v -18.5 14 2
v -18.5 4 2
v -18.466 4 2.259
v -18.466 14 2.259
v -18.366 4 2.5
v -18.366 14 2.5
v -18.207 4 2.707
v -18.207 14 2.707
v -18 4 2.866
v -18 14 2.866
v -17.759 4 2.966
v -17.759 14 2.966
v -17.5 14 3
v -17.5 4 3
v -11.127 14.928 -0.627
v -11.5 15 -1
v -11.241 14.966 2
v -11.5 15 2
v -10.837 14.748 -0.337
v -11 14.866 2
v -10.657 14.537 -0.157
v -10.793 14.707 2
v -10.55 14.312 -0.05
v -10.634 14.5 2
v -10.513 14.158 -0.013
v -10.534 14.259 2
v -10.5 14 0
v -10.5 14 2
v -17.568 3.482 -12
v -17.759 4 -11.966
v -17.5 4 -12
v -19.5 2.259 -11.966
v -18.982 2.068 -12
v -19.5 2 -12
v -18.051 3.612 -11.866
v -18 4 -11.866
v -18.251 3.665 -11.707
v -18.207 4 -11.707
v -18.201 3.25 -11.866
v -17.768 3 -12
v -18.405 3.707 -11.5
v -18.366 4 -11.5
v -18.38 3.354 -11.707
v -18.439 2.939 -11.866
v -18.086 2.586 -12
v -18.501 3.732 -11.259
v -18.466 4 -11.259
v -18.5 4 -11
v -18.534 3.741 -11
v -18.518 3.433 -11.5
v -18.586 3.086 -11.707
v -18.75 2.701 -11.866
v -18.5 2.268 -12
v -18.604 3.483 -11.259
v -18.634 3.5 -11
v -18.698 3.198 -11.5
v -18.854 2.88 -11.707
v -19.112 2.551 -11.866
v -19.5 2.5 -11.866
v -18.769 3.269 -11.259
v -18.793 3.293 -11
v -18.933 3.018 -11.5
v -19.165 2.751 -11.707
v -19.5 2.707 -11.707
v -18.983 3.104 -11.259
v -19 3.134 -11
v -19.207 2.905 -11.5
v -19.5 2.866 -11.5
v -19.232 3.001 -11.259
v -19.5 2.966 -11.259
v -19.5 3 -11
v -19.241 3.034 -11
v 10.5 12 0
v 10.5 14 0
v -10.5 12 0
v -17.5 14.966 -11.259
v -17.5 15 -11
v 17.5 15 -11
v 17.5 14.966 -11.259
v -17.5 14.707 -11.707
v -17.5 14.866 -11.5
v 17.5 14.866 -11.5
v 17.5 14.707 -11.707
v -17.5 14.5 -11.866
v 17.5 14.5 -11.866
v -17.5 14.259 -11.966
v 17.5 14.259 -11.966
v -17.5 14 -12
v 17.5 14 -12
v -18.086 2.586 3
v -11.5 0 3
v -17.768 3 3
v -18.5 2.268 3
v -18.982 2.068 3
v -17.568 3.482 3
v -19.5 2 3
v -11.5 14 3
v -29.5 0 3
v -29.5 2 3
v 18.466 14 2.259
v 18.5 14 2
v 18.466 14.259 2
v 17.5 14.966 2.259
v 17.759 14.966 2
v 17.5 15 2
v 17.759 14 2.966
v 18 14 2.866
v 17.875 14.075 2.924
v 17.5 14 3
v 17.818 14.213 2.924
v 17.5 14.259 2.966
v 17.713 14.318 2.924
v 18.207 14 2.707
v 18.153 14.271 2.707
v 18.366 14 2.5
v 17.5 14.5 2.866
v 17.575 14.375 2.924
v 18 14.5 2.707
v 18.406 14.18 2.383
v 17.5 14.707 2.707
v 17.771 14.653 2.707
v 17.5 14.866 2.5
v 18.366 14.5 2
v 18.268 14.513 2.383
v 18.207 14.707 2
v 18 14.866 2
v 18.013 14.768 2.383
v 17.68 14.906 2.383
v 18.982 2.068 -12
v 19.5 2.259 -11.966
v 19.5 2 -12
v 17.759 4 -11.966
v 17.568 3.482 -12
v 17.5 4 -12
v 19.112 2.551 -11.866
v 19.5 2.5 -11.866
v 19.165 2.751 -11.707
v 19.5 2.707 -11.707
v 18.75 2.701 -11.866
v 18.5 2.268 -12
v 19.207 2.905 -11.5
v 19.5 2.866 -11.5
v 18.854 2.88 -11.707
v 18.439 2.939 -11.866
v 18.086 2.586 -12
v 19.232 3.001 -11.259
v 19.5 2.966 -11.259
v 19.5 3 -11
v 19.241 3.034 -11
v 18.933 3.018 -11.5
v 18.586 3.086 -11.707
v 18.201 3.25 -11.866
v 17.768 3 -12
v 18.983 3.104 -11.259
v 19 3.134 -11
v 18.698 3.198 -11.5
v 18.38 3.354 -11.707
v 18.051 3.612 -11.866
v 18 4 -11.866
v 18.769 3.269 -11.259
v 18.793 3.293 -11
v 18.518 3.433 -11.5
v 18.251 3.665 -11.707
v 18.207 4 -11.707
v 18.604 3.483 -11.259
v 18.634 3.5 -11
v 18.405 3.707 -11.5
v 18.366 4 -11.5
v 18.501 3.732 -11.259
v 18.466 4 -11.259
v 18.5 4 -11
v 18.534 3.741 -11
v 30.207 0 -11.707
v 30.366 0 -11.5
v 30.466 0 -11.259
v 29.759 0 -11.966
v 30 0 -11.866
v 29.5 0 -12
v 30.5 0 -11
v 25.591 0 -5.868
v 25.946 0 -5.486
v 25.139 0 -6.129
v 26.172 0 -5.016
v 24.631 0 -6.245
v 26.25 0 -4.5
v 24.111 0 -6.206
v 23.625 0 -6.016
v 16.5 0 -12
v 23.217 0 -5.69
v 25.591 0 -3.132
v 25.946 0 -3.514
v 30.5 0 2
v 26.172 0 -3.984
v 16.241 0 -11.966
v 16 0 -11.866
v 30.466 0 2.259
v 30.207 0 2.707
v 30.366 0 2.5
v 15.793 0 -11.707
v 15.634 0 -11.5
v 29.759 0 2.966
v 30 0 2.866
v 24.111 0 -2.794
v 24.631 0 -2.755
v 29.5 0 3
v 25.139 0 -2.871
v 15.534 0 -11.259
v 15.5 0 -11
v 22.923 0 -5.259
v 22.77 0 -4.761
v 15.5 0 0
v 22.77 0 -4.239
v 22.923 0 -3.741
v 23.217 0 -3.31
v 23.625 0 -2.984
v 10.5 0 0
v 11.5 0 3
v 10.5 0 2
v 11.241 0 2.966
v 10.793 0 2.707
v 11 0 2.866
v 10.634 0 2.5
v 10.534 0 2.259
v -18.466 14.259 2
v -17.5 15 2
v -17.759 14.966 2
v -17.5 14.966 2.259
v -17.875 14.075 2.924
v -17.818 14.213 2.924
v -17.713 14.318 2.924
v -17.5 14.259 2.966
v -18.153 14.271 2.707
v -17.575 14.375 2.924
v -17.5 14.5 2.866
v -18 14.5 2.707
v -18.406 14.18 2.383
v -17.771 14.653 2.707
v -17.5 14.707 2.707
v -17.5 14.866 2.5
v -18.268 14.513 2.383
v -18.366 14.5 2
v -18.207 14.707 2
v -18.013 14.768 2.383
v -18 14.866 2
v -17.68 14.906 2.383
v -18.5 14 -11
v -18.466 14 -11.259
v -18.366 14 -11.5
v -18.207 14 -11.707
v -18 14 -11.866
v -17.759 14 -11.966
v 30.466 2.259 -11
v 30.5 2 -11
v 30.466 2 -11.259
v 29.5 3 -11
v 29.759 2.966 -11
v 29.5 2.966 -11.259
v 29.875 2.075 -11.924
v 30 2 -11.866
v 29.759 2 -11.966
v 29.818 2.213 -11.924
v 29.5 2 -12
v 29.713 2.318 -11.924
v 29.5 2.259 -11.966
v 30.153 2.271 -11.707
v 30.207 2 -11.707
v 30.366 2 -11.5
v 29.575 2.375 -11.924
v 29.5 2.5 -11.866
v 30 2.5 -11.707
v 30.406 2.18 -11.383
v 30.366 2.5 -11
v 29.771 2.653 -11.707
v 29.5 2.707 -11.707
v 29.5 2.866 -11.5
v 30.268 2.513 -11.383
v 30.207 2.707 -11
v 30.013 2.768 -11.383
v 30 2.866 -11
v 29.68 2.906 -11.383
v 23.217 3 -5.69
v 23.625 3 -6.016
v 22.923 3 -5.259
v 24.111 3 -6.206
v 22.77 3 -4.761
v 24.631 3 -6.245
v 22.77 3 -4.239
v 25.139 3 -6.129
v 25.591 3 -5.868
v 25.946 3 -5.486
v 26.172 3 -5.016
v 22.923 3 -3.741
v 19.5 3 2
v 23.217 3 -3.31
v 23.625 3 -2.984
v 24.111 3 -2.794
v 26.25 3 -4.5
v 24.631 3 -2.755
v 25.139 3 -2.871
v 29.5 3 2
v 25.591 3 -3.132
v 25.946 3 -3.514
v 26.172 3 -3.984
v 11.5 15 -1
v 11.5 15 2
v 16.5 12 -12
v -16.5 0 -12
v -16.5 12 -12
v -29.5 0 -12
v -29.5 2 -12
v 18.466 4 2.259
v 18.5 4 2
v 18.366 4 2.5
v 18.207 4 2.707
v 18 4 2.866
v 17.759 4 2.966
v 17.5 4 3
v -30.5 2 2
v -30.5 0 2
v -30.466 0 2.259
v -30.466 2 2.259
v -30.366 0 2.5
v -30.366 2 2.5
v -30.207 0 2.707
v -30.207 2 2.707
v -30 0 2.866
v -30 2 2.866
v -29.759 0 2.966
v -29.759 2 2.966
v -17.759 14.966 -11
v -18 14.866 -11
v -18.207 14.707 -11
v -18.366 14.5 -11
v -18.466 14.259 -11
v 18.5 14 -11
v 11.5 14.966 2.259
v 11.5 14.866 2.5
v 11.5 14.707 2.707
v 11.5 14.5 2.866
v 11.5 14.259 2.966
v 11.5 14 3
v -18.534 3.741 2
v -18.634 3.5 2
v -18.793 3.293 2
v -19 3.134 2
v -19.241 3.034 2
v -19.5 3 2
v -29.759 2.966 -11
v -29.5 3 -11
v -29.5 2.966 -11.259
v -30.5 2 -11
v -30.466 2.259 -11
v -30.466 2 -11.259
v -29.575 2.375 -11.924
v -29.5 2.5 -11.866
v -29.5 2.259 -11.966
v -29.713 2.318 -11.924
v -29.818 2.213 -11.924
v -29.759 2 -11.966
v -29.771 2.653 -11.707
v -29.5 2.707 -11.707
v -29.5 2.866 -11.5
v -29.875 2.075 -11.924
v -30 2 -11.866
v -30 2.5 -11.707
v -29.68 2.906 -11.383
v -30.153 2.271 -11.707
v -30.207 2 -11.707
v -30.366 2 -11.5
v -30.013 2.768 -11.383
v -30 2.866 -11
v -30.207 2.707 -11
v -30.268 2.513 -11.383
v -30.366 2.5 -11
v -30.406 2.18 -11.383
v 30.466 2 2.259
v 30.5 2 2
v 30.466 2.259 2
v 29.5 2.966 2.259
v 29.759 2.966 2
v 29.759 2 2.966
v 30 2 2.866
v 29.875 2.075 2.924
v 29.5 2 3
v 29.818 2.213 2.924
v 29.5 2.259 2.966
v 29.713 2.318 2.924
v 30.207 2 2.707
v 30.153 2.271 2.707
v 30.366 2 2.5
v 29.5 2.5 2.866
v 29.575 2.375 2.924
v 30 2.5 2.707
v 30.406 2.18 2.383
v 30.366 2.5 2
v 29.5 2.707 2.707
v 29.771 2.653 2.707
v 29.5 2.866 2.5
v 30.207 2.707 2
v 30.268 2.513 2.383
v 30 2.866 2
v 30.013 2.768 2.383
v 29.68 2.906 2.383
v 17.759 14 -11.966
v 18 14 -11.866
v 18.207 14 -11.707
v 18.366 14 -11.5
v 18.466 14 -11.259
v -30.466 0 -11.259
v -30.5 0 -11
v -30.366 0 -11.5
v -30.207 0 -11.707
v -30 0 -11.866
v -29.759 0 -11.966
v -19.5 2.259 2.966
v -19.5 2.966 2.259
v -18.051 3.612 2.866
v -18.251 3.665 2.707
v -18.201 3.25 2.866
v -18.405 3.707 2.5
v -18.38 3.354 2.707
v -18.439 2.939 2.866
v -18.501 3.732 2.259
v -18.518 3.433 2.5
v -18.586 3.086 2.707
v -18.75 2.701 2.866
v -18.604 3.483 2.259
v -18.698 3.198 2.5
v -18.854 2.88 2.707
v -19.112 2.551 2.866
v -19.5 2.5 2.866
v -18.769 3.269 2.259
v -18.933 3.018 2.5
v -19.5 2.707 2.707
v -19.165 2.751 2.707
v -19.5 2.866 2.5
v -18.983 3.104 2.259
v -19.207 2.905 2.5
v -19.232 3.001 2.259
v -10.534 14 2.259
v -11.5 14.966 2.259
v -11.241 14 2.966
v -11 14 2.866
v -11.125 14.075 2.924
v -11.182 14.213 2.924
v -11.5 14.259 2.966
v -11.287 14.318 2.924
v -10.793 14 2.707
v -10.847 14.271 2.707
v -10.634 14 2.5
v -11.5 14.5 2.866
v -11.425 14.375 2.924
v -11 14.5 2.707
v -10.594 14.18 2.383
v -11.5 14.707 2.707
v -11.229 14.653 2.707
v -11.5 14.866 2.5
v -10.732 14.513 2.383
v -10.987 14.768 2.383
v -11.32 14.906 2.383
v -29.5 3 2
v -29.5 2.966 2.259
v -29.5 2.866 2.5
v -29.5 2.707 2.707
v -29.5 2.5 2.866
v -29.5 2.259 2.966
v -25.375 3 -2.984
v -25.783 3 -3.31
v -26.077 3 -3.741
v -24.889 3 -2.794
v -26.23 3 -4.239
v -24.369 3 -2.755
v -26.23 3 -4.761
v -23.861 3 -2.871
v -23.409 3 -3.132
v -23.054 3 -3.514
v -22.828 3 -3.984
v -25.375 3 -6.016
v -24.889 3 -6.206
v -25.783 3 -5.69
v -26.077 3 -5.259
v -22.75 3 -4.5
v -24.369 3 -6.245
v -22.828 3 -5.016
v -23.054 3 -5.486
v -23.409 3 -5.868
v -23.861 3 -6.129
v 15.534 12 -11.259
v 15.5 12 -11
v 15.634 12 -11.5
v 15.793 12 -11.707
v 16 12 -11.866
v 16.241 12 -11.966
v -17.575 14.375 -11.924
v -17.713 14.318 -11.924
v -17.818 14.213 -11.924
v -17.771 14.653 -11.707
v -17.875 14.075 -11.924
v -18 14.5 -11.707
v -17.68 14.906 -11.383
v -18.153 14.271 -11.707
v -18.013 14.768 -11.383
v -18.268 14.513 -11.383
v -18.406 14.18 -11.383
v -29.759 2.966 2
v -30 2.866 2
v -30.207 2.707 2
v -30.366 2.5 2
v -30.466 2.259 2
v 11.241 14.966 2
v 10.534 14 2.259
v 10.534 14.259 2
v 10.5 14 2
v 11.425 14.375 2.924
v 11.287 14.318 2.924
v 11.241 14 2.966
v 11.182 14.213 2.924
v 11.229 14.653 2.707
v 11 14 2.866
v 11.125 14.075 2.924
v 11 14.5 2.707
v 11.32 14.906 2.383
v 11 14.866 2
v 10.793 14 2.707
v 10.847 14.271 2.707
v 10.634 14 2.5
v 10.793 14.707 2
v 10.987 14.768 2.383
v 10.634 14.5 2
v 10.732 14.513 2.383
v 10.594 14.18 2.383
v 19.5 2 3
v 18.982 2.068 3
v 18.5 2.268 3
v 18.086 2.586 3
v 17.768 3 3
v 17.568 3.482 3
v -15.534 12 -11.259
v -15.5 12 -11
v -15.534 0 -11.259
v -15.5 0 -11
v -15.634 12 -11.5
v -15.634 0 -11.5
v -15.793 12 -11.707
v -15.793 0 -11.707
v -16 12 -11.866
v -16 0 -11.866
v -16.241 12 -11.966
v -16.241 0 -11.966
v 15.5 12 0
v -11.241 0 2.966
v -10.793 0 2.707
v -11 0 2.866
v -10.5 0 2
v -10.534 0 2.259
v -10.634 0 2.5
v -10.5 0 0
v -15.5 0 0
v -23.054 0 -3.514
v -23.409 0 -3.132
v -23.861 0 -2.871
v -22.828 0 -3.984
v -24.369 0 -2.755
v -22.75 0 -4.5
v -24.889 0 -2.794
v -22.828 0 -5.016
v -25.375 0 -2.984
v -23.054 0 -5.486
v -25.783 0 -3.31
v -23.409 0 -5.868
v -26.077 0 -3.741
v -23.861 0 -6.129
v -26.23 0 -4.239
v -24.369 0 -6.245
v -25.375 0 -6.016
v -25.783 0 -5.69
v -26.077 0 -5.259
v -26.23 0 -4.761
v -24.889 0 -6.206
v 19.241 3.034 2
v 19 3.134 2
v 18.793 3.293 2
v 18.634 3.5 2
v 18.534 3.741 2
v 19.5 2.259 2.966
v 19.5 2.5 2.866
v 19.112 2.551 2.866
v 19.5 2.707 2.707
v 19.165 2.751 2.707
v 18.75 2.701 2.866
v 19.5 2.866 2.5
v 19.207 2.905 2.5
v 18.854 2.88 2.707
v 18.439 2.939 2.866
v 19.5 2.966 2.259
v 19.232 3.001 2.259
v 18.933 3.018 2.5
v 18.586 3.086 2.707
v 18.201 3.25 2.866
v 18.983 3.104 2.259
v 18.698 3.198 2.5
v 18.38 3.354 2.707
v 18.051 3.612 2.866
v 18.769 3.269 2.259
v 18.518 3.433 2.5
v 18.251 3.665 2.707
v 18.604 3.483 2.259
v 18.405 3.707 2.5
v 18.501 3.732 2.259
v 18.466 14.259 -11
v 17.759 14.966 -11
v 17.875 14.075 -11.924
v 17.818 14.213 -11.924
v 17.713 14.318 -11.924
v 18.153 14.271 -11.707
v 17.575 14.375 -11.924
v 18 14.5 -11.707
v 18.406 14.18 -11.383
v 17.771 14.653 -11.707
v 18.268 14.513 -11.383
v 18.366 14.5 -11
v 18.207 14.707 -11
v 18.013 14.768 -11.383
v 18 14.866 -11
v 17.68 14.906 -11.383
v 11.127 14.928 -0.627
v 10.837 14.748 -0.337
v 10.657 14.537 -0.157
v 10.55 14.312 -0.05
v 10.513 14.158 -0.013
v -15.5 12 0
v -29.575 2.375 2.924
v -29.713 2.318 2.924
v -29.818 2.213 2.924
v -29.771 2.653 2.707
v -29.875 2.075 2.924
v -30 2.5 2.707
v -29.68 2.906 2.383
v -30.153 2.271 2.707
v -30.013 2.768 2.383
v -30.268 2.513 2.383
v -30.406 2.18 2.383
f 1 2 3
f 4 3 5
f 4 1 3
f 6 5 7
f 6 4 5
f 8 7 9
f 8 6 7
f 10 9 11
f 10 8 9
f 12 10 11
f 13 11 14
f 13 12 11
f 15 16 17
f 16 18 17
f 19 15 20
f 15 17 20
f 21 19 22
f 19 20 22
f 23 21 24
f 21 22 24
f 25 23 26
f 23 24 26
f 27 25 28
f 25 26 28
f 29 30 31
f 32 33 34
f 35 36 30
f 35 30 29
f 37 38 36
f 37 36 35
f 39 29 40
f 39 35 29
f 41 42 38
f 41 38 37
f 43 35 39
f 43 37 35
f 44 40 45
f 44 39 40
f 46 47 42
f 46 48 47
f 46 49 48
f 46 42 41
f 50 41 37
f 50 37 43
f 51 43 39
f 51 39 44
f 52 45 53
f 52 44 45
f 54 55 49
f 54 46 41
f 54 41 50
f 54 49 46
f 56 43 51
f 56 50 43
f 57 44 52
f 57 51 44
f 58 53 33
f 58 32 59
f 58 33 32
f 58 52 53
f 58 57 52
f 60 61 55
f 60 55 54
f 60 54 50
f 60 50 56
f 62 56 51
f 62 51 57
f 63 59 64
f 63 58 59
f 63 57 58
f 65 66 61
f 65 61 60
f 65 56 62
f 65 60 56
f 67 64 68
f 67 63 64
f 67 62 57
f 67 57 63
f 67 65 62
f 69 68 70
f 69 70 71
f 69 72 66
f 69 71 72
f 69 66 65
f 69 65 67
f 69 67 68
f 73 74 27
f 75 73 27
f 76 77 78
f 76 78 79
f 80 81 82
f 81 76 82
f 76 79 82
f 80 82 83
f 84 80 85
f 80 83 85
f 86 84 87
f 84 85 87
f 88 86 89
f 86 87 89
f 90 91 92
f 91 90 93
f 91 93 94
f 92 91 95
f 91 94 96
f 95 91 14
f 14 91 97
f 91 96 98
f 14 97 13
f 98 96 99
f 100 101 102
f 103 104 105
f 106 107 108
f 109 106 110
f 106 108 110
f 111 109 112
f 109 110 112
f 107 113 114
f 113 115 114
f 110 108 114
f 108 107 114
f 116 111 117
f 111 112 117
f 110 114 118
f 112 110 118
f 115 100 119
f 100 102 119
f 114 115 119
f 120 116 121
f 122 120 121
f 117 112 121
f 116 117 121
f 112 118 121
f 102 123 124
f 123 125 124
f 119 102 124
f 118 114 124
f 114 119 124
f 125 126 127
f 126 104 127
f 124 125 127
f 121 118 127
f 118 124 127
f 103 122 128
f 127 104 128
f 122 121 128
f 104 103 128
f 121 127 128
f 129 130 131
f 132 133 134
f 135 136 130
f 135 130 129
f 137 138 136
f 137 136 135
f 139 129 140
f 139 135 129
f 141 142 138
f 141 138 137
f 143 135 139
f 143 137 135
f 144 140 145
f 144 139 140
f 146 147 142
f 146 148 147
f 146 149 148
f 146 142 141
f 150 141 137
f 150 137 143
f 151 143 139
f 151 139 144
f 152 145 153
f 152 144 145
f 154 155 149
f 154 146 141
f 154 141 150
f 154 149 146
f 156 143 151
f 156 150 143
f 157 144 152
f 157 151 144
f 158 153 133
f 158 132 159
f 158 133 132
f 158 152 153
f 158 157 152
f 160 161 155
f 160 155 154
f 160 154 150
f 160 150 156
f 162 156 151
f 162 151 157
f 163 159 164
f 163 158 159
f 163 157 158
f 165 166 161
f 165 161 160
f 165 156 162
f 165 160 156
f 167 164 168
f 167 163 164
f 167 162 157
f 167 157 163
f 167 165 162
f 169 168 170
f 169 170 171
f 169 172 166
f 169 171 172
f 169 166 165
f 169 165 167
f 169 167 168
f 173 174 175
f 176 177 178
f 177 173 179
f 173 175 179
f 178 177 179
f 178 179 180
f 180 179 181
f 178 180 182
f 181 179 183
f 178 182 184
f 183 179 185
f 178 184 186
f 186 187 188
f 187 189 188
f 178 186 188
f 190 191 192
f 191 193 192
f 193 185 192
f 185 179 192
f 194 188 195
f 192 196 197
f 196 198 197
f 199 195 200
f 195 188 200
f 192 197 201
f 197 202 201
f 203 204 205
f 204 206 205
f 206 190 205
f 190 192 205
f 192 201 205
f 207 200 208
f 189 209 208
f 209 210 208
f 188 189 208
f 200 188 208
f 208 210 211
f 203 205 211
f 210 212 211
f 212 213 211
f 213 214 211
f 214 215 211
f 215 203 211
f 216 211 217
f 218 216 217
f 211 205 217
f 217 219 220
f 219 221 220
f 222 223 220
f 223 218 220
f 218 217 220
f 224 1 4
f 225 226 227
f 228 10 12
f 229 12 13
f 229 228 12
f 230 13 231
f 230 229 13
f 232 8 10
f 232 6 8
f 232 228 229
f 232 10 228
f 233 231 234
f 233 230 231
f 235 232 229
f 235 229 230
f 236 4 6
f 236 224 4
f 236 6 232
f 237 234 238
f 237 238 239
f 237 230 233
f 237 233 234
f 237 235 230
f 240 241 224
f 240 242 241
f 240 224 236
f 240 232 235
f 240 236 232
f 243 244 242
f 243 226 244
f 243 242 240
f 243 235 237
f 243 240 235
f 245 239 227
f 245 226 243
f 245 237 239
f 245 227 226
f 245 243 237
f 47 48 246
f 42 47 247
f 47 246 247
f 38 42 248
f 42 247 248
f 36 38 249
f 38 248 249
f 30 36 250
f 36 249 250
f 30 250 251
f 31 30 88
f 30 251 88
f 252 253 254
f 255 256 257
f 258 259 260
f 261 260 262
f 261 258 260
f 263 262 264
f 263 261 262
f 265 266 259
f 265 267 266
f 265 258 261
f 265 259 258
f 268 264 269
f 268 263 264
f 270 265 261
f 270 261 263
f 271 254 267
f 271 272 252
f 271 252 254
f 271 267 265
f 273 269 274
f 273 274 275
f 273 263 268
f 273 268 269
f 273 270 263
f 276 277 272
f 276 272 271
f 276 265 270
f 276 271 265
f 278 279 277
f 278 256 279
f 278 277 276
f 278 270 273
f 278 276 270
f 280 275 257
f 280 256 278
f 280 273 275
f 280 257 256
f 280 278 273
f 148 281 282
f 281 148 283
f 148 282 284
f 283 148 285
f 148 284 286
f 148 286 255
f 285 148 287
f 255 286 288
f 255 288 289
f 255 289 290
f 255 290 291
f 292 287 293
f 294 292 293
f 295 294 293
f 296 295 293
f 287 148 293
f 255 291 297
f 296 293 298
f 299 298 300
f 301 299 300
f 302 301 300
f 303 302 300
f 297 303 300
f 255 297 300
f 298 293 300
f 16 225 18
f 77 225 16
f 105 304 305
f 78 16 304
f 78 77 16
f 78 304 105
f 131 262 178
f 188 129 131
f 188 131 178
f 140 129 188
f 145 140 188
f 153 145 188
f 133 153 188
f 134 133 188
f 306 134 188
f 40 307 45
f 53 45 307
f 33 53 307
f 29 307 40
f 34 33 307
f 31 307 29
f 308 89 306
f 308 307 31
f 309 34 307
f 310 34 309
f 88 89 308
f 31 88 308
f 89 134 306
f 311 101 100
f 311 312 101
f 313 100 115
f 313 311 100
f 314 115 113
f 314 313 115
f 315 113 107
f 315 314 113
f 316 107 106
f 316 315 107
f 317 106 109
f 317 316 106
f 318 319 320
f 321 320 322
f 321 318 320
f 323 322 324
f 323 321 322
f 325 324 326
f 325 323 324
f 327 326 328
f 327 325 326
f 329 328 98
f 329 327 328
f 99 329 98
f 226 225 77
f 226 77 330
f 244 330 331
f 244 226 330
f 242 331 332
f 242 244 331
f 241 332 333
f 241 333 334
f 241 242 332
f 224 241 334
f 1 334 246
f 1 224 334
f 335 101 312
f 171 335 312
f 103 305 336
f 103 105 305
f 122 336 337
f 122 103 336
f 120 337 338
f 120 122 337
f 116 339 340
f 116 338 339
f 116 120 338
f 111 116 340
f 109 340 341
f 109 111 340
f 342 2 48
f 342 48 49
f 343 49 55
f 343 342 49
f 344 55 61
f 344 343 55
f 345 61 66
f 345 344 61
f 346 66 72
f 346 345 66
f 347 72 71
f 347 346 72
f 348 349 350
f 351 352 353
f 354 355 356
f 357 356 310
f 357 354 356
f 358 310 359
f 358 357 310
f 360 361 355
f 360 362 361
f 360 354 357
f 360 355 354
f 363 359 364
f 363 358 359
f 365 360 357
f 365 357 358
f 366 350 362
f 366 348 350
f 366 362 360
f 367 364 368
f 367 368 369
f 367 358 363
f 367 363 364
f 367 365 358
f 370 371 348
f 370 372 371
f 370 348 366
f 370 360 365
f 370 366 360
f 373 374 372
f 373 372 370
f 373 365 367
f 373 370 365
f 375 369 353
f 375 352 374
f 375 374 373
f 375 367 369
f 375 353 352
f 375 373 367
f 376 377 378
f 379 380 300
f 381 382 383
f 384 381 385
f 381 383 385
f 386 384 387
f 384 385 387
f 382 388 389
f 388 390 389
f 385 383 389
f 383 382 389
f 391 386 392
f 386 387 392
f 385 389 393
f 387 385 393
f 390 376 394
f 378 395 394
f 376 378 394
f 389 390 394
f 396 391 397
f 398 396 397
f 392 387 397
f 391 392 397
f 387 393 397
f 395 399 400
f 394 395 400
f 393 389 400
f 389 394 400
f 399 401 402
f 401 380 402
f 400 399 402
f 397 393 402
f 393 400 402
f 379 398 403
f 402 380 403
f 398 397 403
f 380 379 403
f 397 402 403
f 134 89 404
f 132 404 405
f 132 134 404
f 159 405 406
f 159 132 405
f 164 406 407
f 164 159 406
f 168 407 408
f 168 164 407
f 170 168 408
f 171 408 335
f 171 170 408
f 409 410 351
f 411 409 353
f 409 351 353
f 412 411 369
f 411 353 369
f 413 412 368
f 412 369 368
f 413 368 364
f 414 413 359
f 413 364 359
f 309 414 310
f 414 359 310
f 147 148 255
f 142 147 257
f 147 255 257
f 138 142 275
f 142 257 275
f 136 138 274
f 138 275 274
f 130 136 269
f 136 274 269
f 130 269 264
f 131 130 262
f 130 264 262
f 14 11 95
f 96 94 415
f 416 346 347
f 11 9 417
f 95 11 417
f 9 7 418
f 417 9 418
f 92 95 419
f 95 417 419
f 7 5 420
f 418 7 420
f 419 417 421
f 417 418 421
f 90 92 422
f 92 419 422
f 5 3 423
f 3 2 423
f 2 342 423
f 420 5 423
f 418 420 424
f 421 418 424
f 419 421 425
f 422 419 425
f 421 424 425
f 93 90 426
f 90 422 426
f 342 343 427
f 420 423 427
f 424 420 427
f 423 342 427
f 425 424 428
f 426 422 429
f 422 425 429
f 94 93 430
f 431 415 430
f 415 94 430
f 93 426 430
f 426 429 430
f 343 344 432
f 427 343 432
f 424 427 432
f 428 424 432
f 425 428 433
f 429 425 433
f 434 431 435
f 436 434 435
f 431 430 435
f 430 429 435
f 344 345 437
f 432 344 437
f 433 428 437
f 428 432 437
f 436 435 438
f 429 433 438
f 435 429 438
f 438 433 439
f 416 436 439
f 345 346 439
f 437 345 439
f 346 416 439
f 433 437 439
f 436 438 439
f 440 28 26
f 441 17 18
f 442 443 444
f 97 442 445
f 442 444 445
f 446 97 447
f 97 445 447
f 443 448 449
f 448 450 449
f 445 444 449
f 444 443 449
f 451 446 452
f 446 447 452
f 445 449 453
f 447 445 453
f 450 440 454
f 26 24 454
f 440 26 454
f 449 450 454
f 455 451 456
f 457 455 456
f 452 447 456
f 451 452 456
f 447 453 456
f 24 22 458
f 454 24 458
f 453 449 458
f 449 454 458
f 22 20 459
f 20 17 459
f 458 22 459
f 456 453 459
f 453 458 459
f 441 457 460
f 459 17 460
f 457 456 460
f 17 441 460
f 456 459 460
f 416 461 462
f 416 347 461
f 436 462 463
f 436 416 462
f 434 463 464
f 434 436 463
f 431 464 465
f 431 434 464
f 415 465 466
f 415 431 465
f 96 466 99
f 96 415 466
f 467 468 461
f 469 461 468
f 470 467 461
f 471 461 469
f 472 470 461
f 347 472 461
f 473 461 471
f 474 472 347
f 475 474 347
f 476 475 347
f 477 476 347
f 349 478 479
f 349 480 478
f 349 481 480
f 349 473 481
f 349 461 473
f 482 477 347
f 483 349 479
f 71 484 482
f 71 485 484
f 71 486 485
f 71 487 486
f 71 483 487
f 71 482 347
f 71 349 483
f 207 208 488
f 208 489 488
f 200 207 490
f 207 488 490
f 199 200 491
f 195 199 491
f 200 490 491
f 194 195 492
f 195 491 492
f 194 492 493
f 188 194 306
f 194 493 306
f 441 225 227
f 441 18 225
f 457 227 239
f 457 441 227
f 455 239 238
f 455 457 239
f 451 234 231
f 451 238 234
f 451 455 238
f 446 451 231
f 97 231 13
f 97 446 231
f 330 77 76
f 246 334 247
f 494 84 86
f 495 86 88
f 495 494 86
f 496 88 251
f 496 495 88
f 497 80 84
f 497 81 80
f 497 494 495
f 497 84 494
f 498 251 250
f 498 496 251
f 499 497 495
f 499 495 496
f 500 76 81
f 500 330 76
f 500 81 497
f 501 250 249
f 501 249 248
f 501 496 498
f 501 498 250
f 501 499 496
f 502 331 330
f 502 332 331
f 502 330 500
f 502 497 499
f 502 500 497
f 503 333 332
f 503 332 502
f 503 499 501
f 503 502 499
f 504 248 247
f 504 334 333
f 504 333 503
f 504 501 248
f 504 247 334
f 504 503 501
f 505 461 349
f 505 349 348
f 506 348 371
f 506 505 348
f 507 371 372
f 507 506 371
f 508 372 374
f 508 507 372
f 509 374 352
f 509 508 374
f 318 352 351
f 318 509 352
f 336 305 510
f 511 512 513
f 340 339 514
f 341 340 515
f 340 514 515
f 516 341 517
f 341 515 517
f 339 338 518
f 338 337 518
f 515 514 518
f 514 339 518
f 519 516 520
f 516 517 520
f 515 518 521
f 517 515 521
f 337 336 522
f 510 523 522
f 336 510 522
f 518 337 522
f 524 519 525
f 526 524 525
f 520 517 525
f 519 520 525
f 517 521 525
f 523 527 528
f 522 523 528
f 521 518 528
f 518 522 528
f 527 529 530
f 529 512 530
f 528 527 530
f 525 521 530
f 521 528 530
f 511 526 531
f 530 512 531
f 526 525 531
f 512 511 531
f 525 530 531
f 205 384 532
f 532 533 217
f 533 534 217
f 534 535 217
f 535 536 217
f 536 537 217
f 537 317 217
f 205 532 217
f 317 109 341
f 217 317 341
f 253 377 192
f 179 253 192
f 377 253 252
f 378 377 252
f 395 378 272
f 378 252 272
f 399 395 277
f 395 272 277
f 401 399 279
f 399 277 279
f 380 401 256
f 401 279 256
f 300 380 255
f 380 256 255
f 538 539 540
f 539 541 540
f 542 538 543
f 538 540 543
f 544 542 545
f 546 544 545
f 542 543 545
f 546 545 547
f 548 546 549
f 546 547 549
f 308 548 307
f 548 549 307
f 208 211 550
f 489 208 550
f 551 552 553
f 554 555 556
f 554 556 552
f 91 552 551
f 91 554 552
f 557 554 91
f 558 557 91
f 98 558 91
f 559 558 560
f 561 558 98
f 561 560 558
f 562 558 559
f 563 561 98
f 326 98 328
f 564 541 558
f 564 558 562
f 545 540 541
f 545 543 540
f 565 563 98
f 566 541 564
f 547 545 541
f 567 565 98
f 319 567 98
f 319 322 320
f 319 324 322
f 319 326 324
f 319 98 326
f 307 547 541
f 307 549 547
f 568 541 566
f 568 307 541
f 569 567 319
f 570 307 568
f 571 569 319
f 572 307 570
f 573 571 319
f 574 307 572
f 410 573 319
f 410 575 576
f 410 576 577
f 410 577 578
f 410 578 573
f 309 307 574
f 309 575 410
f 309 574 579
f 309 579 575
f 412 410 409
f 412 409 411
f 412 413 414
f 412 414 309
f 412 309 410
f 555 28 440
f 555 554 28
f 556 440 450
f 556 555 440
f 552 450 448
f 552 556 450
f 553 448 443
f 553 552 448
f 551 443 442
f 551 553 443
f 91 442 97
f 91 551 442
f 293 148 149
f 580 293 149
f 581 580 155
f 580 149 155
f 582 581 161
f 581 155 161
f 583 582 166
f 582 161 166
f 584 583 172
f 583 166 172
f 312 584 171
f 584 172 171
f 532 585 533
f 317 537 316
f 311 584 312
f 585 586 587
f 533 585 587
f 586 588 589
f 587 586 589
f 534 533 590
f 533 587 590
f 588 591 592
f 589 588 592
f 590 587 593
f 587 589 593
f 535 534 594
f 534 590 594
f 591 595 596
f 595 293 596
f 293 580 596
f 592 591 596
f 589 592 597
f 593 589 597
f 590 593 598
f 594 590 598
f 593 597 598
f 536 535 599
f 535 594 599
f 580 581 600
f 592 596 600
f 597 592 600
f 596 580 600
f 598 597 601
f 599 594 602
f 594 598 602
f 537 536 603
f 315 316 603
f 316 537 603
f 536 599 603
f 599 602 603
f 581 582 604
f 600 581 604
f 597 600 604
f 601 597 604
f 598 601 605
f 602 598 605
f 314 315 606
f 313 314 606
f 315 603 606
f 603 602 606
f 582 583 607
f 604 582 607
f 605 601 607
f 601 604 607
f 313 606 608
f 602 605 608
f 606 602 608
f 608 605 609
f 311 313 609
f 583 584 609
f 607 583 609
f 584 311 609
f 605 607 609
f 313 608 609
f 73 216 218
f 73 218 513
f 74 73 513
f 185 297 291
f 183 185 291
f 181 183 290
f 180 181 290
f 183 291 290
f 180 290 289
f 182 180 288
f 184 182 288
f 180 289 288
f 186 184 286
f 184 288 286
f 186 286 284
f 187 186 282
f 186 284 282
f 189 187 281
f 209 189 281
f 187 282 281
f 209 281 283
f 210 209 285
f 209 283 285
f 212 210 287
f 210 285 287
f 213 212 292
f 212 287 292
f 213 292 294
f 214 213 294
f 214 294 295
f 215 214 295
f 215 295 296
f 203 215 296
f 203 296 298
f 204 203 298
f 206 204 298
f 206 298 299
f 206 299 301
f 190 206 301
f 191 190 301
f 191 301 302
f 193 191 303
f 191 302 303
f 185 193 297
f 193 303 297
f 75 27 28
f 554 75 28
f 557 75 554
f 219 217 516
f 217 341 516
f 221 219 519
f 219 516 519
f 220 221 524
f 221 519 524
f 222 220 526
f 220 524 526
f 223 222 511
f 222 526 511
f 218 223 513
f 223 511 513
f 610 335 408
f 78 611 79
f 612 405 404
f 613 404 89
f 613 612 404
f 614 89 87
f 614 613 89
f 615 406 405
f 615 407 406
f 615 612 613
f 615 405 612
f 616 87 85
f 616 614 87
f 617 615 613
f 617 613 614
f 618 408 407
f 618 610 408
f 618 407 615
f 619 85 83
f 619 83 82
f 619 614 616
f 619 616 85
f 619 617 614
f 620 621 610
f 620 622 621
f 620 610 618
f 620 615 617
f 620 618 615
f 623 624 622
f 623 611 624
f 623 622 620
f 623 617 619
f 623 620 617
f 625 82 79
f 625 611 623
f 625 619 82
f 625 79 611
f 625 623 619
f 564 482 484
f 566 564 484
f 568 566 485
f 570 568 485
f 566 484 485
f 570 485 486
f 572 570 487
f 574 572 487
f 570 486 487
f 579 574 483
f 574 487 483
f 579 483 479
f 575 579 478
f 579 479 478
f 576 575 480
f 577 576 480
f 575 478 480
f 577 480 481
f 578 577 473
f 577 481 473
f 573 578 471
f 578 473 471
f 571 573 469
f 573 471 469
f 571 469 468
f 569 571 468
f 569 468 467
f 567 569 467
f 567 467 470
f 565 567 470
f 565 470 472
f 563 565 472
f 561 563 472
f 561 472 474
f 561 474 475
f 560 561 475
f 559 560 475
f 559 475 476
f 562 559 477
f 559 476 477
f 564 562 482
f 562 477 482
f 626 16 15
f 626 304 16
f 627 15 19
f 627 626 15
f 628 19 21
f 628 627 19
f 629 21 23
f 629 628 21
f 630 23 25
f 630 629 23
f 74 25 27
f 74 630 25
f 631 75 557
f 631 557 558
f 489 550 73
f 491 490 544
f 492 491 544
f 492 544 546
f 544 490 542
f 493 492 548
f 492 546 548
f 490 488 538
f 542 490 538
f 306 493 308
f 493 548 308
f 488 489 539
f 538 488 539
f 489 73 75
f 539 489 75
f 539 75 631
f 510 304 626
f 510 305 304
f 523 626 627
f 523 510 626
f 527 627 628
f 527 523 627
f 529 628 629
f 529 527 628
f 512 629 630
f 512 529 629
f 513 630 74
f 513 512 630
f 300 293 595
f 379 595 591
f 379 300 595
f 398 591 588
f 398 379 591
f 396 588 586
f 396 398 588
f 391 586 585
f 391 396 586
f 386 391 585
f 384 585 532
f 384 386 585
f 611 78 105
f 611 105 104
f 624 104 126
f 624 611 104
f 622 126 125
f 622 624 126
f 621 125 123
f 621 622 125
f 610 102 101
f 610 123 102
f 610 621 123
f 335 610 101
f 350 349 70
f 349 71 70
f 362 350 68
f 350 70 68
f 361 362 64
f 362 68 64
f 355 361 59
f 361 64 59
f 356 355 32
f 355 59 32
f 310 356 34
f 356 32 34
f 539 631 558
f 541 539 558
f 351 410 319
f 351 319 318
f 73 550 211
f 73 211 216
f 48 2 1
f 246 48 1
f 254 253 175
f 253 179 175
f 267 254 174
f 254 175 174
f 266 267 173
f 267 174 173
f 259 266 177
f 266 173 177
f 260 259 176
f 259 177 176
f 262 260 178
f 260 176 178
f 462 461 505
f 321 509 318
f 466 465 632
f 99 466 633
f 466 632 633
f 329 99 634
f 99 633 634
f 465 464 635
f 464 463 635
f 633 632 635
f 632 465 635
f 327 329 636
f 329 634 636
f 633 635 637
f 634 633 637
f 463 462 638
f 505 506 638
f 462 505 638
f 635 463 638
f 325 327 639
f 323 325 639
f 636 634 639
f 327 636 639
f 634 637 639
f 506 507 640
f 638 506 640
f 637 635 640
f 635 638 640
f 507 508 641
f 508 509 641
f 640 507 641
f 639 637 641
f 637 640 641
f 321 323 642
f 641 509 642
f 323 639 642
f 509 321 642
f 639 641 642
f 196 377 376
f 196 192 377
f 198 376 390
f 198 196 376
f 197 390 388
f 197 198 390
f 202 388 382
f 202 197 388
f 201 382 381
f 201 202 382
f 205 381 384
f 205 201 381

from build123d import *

# Parameters (mm, degrees)
BOSS_EXTRUDE1_DEPTH = 12
BOSS_EXTRUDE2_DEPTH = 3
FILLET1_R           = 1
SKETCH3_R           = 1.75
CUT_EXTRUDE2_DEPTH  = 3


with BuildPart() as part:
    # Sketch1 → Boss-Extrude1 (new body)
    with BuildSketch(Plane.XY):
        Polygon((-30.5, 3), (-18.5, 3), (-18.5, 15), (18.5, 15), (18.5, 3), (30.5, 3), (30.5, 0), (15.5, 0), (15.5, 12), (-15.5, 12), (-15.5, 0), (-30.5, 0), align=None)
    extrude(amount=-BOSS_EXTRUDE1_DEPTH)

    # Sketch2 → Boss-Extrude2 (add)
    with BuildSketch(Plane.XY):
        Polygon((-18.5, 15), (-10.5, 15), (-10.5, 0), (-30.5, 0), (-30.5, 3), (-18.5, 3), align=None)
        Polygon((30.5, 0), (10.5, 0), (10.5, 15), (18.5, 15), (18.5, 3), (30.5, 3), align=None)
    extrude(amount=BOSS_EXTRUDE2_DEPTH)

    # Fillet1
    fillet1_edges = [part.edges().sort_by_distance(p)[0] for p in [
        (-15.5, 6, -12),
        (-30.5, 3, -4.5),
        (-18.5, 3, -4.5),
        (-18.5, 15, -4.5),
        (15.5, 6, -12),
        (18.5, 15, -4.5),
        (18.5, 3, -4.5),
        (30.5, 3, -4.5),
        (30.5, 1.5, -12),
        (24.5, 3, -12),
        (18.5, 9, -12),
        (-10.5, 15, 1.5),
        (-18.5, 9, 3),
        (-24.5, 3, 3),
        (-30.5, 1.5, 3),
        (-10.5, 7.5, 3),
        (-14.5, 15, 3),
        (0, 15, -12),
        (-18.5, 9, -12),
        (-24.5, 3, -12),
        (-30.5, 1.5, -12),
        (0, 15, 0),
        (10.5, 15, 1.5),
        (30.5, 1.5, 3),
        (24.5, 3, 3),
        (18.5, 9, 3),
        (14.5, 15, 3),
        (10.5, 7.5, 3),
    ]]
    fillet(fillet1_edges, radius=FILLET1_R)

    # Sketch3 → Cut-Extrude2 (cut)
    with BuildSketch(Plane(origin=(0, 3, 0), x_dir=(1, 0, 0), z_dir=(0, 1, 0))):
        with Locations((-24.5, 4.5)):
            Circle(SKETCH3_R)
        with Locations((24.5, 4.5)):
            Circle(SKETCH3_R)
    extrude(amount=-CUT_EXTRUDE2_DEPTH, mode=Mode.SUBTRACT)


solid = part.part
